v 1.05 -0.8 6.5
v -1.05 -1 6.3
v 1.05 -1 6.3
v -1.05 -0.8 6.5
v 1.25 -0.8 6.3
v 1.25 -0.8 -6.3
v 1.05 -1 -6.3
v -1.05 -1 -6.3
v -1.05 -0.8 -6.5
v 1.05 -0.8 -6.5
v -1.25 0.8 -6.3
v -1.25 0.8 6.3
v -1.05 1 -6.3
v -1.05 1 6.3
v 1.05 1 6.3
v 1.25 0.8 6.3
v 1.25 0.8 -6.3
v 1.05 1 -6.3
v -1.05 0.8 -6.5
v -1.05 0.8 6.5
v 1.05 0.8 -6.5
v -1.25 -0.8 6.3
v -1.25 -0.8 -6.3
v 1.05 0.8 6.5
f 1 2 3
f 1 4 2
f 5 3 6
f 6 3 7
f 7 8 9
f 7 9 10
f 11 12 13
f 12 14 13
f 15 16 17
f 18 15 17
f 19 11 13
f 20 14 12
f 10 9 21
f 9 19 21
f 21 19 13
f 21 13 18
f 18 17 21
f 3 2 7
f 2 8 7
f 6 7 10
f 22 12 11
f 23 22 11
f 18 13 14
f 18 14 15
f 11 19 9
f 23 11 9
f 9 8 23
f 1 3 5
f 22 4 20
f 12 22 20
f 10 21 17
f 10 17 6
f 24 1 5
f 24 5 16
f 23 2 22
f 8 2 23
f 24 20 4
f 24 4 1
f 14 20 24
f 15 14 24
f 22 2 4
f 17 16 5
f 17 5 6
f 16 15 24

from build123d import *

# Parameters (mm, degrees)
SKETCH_1_W      = 2.5
SKETCH_1_H      = 13
EXTRUDE_1_DEPTH = 1
CHAMFER_1_SIZE  = 0.2


with BuildPart() as part:
    # 草图1 → 凸台-拉伸1 (new, symmetric)
    with BuildSketch(Plane(origin=(0, 0, 0), x_dir=(1, 0, 0), z_dir=(0, 1, 0))):
        Rectangle(SKETCH_1_W, SKETCH_1_H)
    extrude(amount=EXTRUDE_1_DEPTH, both=True)

    # 倒角1
    chamfer_1_edges = [part.edges().sort_by_distance(p)[0] for p in [
        (-1.25, 1, 0),
        (0, 1, 6.5),
        (1.25, 1, 0),
        (0, -1, 6.5),
        (-1.25, -1, 0),
        (0, -1, -6.5),
        (1.25, -1, 0),
        (1.25, 0, 6.5),
        (-1.25, 0, 6.5),
        (-1.25, 0, -6.5),
        (1.25, 0, -6.5),
        (0, 1, -6.5),
    ]]
    chamfer(chamfer_1_edges, length=CHAMFER_1_SIZE)


solid = part.part
